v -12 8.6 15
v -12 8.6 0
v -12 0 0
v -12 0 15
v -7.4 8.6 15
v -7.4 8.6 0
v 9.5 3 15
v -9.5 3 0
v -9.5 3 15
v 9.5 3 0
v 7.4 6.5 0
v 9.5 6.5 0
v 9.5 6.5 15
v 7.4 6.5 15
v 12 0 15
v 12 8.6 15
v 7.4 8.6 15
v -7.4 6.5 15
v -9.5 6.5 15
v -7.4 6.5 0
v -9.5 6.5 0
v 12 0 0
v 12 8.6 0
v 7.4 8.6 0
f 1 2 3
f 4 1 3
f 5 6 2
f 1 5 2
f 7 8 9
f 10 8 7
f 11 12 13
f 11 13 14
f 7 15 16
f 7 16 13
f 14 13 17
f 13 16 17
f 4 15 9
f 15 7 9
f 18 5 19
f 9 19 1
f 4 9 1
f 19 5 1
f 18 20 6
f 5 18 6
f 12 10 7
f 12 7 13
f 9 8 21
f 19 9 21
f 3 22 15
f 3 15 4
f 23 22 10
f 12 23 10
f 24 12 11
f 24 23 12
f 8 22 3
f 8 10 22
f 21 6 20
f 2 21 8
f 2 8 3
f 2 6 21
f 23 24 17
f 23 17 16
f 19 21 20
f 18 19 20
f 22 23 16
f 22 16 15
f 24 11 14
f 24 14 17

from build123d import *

# Parameters (mm, degrees)
F1_DEPTH = 15


with BuildPart() as f1:
    # F0 (on Top) → F1 (new body)
    with BuildSketch(Plane.XY):
        Polygon((-11, 0), (0, 0), (0, 3), (-4, 3), (-6, 3), (-9.5, 3), (-9.5, 6.5), (-7.4, 6.5), (-7.4, 8.6), (-11, 8.6), (-12, 8.6), (-12, 0), align=None)
    extrude(amount=F1_DEPTH)

    # F2: F1 across plane


with BuildPart() as f1_1:
    add(f1.part)
    add(f1.part.mirror(Plane.YZ))


solid = f1_1.part
